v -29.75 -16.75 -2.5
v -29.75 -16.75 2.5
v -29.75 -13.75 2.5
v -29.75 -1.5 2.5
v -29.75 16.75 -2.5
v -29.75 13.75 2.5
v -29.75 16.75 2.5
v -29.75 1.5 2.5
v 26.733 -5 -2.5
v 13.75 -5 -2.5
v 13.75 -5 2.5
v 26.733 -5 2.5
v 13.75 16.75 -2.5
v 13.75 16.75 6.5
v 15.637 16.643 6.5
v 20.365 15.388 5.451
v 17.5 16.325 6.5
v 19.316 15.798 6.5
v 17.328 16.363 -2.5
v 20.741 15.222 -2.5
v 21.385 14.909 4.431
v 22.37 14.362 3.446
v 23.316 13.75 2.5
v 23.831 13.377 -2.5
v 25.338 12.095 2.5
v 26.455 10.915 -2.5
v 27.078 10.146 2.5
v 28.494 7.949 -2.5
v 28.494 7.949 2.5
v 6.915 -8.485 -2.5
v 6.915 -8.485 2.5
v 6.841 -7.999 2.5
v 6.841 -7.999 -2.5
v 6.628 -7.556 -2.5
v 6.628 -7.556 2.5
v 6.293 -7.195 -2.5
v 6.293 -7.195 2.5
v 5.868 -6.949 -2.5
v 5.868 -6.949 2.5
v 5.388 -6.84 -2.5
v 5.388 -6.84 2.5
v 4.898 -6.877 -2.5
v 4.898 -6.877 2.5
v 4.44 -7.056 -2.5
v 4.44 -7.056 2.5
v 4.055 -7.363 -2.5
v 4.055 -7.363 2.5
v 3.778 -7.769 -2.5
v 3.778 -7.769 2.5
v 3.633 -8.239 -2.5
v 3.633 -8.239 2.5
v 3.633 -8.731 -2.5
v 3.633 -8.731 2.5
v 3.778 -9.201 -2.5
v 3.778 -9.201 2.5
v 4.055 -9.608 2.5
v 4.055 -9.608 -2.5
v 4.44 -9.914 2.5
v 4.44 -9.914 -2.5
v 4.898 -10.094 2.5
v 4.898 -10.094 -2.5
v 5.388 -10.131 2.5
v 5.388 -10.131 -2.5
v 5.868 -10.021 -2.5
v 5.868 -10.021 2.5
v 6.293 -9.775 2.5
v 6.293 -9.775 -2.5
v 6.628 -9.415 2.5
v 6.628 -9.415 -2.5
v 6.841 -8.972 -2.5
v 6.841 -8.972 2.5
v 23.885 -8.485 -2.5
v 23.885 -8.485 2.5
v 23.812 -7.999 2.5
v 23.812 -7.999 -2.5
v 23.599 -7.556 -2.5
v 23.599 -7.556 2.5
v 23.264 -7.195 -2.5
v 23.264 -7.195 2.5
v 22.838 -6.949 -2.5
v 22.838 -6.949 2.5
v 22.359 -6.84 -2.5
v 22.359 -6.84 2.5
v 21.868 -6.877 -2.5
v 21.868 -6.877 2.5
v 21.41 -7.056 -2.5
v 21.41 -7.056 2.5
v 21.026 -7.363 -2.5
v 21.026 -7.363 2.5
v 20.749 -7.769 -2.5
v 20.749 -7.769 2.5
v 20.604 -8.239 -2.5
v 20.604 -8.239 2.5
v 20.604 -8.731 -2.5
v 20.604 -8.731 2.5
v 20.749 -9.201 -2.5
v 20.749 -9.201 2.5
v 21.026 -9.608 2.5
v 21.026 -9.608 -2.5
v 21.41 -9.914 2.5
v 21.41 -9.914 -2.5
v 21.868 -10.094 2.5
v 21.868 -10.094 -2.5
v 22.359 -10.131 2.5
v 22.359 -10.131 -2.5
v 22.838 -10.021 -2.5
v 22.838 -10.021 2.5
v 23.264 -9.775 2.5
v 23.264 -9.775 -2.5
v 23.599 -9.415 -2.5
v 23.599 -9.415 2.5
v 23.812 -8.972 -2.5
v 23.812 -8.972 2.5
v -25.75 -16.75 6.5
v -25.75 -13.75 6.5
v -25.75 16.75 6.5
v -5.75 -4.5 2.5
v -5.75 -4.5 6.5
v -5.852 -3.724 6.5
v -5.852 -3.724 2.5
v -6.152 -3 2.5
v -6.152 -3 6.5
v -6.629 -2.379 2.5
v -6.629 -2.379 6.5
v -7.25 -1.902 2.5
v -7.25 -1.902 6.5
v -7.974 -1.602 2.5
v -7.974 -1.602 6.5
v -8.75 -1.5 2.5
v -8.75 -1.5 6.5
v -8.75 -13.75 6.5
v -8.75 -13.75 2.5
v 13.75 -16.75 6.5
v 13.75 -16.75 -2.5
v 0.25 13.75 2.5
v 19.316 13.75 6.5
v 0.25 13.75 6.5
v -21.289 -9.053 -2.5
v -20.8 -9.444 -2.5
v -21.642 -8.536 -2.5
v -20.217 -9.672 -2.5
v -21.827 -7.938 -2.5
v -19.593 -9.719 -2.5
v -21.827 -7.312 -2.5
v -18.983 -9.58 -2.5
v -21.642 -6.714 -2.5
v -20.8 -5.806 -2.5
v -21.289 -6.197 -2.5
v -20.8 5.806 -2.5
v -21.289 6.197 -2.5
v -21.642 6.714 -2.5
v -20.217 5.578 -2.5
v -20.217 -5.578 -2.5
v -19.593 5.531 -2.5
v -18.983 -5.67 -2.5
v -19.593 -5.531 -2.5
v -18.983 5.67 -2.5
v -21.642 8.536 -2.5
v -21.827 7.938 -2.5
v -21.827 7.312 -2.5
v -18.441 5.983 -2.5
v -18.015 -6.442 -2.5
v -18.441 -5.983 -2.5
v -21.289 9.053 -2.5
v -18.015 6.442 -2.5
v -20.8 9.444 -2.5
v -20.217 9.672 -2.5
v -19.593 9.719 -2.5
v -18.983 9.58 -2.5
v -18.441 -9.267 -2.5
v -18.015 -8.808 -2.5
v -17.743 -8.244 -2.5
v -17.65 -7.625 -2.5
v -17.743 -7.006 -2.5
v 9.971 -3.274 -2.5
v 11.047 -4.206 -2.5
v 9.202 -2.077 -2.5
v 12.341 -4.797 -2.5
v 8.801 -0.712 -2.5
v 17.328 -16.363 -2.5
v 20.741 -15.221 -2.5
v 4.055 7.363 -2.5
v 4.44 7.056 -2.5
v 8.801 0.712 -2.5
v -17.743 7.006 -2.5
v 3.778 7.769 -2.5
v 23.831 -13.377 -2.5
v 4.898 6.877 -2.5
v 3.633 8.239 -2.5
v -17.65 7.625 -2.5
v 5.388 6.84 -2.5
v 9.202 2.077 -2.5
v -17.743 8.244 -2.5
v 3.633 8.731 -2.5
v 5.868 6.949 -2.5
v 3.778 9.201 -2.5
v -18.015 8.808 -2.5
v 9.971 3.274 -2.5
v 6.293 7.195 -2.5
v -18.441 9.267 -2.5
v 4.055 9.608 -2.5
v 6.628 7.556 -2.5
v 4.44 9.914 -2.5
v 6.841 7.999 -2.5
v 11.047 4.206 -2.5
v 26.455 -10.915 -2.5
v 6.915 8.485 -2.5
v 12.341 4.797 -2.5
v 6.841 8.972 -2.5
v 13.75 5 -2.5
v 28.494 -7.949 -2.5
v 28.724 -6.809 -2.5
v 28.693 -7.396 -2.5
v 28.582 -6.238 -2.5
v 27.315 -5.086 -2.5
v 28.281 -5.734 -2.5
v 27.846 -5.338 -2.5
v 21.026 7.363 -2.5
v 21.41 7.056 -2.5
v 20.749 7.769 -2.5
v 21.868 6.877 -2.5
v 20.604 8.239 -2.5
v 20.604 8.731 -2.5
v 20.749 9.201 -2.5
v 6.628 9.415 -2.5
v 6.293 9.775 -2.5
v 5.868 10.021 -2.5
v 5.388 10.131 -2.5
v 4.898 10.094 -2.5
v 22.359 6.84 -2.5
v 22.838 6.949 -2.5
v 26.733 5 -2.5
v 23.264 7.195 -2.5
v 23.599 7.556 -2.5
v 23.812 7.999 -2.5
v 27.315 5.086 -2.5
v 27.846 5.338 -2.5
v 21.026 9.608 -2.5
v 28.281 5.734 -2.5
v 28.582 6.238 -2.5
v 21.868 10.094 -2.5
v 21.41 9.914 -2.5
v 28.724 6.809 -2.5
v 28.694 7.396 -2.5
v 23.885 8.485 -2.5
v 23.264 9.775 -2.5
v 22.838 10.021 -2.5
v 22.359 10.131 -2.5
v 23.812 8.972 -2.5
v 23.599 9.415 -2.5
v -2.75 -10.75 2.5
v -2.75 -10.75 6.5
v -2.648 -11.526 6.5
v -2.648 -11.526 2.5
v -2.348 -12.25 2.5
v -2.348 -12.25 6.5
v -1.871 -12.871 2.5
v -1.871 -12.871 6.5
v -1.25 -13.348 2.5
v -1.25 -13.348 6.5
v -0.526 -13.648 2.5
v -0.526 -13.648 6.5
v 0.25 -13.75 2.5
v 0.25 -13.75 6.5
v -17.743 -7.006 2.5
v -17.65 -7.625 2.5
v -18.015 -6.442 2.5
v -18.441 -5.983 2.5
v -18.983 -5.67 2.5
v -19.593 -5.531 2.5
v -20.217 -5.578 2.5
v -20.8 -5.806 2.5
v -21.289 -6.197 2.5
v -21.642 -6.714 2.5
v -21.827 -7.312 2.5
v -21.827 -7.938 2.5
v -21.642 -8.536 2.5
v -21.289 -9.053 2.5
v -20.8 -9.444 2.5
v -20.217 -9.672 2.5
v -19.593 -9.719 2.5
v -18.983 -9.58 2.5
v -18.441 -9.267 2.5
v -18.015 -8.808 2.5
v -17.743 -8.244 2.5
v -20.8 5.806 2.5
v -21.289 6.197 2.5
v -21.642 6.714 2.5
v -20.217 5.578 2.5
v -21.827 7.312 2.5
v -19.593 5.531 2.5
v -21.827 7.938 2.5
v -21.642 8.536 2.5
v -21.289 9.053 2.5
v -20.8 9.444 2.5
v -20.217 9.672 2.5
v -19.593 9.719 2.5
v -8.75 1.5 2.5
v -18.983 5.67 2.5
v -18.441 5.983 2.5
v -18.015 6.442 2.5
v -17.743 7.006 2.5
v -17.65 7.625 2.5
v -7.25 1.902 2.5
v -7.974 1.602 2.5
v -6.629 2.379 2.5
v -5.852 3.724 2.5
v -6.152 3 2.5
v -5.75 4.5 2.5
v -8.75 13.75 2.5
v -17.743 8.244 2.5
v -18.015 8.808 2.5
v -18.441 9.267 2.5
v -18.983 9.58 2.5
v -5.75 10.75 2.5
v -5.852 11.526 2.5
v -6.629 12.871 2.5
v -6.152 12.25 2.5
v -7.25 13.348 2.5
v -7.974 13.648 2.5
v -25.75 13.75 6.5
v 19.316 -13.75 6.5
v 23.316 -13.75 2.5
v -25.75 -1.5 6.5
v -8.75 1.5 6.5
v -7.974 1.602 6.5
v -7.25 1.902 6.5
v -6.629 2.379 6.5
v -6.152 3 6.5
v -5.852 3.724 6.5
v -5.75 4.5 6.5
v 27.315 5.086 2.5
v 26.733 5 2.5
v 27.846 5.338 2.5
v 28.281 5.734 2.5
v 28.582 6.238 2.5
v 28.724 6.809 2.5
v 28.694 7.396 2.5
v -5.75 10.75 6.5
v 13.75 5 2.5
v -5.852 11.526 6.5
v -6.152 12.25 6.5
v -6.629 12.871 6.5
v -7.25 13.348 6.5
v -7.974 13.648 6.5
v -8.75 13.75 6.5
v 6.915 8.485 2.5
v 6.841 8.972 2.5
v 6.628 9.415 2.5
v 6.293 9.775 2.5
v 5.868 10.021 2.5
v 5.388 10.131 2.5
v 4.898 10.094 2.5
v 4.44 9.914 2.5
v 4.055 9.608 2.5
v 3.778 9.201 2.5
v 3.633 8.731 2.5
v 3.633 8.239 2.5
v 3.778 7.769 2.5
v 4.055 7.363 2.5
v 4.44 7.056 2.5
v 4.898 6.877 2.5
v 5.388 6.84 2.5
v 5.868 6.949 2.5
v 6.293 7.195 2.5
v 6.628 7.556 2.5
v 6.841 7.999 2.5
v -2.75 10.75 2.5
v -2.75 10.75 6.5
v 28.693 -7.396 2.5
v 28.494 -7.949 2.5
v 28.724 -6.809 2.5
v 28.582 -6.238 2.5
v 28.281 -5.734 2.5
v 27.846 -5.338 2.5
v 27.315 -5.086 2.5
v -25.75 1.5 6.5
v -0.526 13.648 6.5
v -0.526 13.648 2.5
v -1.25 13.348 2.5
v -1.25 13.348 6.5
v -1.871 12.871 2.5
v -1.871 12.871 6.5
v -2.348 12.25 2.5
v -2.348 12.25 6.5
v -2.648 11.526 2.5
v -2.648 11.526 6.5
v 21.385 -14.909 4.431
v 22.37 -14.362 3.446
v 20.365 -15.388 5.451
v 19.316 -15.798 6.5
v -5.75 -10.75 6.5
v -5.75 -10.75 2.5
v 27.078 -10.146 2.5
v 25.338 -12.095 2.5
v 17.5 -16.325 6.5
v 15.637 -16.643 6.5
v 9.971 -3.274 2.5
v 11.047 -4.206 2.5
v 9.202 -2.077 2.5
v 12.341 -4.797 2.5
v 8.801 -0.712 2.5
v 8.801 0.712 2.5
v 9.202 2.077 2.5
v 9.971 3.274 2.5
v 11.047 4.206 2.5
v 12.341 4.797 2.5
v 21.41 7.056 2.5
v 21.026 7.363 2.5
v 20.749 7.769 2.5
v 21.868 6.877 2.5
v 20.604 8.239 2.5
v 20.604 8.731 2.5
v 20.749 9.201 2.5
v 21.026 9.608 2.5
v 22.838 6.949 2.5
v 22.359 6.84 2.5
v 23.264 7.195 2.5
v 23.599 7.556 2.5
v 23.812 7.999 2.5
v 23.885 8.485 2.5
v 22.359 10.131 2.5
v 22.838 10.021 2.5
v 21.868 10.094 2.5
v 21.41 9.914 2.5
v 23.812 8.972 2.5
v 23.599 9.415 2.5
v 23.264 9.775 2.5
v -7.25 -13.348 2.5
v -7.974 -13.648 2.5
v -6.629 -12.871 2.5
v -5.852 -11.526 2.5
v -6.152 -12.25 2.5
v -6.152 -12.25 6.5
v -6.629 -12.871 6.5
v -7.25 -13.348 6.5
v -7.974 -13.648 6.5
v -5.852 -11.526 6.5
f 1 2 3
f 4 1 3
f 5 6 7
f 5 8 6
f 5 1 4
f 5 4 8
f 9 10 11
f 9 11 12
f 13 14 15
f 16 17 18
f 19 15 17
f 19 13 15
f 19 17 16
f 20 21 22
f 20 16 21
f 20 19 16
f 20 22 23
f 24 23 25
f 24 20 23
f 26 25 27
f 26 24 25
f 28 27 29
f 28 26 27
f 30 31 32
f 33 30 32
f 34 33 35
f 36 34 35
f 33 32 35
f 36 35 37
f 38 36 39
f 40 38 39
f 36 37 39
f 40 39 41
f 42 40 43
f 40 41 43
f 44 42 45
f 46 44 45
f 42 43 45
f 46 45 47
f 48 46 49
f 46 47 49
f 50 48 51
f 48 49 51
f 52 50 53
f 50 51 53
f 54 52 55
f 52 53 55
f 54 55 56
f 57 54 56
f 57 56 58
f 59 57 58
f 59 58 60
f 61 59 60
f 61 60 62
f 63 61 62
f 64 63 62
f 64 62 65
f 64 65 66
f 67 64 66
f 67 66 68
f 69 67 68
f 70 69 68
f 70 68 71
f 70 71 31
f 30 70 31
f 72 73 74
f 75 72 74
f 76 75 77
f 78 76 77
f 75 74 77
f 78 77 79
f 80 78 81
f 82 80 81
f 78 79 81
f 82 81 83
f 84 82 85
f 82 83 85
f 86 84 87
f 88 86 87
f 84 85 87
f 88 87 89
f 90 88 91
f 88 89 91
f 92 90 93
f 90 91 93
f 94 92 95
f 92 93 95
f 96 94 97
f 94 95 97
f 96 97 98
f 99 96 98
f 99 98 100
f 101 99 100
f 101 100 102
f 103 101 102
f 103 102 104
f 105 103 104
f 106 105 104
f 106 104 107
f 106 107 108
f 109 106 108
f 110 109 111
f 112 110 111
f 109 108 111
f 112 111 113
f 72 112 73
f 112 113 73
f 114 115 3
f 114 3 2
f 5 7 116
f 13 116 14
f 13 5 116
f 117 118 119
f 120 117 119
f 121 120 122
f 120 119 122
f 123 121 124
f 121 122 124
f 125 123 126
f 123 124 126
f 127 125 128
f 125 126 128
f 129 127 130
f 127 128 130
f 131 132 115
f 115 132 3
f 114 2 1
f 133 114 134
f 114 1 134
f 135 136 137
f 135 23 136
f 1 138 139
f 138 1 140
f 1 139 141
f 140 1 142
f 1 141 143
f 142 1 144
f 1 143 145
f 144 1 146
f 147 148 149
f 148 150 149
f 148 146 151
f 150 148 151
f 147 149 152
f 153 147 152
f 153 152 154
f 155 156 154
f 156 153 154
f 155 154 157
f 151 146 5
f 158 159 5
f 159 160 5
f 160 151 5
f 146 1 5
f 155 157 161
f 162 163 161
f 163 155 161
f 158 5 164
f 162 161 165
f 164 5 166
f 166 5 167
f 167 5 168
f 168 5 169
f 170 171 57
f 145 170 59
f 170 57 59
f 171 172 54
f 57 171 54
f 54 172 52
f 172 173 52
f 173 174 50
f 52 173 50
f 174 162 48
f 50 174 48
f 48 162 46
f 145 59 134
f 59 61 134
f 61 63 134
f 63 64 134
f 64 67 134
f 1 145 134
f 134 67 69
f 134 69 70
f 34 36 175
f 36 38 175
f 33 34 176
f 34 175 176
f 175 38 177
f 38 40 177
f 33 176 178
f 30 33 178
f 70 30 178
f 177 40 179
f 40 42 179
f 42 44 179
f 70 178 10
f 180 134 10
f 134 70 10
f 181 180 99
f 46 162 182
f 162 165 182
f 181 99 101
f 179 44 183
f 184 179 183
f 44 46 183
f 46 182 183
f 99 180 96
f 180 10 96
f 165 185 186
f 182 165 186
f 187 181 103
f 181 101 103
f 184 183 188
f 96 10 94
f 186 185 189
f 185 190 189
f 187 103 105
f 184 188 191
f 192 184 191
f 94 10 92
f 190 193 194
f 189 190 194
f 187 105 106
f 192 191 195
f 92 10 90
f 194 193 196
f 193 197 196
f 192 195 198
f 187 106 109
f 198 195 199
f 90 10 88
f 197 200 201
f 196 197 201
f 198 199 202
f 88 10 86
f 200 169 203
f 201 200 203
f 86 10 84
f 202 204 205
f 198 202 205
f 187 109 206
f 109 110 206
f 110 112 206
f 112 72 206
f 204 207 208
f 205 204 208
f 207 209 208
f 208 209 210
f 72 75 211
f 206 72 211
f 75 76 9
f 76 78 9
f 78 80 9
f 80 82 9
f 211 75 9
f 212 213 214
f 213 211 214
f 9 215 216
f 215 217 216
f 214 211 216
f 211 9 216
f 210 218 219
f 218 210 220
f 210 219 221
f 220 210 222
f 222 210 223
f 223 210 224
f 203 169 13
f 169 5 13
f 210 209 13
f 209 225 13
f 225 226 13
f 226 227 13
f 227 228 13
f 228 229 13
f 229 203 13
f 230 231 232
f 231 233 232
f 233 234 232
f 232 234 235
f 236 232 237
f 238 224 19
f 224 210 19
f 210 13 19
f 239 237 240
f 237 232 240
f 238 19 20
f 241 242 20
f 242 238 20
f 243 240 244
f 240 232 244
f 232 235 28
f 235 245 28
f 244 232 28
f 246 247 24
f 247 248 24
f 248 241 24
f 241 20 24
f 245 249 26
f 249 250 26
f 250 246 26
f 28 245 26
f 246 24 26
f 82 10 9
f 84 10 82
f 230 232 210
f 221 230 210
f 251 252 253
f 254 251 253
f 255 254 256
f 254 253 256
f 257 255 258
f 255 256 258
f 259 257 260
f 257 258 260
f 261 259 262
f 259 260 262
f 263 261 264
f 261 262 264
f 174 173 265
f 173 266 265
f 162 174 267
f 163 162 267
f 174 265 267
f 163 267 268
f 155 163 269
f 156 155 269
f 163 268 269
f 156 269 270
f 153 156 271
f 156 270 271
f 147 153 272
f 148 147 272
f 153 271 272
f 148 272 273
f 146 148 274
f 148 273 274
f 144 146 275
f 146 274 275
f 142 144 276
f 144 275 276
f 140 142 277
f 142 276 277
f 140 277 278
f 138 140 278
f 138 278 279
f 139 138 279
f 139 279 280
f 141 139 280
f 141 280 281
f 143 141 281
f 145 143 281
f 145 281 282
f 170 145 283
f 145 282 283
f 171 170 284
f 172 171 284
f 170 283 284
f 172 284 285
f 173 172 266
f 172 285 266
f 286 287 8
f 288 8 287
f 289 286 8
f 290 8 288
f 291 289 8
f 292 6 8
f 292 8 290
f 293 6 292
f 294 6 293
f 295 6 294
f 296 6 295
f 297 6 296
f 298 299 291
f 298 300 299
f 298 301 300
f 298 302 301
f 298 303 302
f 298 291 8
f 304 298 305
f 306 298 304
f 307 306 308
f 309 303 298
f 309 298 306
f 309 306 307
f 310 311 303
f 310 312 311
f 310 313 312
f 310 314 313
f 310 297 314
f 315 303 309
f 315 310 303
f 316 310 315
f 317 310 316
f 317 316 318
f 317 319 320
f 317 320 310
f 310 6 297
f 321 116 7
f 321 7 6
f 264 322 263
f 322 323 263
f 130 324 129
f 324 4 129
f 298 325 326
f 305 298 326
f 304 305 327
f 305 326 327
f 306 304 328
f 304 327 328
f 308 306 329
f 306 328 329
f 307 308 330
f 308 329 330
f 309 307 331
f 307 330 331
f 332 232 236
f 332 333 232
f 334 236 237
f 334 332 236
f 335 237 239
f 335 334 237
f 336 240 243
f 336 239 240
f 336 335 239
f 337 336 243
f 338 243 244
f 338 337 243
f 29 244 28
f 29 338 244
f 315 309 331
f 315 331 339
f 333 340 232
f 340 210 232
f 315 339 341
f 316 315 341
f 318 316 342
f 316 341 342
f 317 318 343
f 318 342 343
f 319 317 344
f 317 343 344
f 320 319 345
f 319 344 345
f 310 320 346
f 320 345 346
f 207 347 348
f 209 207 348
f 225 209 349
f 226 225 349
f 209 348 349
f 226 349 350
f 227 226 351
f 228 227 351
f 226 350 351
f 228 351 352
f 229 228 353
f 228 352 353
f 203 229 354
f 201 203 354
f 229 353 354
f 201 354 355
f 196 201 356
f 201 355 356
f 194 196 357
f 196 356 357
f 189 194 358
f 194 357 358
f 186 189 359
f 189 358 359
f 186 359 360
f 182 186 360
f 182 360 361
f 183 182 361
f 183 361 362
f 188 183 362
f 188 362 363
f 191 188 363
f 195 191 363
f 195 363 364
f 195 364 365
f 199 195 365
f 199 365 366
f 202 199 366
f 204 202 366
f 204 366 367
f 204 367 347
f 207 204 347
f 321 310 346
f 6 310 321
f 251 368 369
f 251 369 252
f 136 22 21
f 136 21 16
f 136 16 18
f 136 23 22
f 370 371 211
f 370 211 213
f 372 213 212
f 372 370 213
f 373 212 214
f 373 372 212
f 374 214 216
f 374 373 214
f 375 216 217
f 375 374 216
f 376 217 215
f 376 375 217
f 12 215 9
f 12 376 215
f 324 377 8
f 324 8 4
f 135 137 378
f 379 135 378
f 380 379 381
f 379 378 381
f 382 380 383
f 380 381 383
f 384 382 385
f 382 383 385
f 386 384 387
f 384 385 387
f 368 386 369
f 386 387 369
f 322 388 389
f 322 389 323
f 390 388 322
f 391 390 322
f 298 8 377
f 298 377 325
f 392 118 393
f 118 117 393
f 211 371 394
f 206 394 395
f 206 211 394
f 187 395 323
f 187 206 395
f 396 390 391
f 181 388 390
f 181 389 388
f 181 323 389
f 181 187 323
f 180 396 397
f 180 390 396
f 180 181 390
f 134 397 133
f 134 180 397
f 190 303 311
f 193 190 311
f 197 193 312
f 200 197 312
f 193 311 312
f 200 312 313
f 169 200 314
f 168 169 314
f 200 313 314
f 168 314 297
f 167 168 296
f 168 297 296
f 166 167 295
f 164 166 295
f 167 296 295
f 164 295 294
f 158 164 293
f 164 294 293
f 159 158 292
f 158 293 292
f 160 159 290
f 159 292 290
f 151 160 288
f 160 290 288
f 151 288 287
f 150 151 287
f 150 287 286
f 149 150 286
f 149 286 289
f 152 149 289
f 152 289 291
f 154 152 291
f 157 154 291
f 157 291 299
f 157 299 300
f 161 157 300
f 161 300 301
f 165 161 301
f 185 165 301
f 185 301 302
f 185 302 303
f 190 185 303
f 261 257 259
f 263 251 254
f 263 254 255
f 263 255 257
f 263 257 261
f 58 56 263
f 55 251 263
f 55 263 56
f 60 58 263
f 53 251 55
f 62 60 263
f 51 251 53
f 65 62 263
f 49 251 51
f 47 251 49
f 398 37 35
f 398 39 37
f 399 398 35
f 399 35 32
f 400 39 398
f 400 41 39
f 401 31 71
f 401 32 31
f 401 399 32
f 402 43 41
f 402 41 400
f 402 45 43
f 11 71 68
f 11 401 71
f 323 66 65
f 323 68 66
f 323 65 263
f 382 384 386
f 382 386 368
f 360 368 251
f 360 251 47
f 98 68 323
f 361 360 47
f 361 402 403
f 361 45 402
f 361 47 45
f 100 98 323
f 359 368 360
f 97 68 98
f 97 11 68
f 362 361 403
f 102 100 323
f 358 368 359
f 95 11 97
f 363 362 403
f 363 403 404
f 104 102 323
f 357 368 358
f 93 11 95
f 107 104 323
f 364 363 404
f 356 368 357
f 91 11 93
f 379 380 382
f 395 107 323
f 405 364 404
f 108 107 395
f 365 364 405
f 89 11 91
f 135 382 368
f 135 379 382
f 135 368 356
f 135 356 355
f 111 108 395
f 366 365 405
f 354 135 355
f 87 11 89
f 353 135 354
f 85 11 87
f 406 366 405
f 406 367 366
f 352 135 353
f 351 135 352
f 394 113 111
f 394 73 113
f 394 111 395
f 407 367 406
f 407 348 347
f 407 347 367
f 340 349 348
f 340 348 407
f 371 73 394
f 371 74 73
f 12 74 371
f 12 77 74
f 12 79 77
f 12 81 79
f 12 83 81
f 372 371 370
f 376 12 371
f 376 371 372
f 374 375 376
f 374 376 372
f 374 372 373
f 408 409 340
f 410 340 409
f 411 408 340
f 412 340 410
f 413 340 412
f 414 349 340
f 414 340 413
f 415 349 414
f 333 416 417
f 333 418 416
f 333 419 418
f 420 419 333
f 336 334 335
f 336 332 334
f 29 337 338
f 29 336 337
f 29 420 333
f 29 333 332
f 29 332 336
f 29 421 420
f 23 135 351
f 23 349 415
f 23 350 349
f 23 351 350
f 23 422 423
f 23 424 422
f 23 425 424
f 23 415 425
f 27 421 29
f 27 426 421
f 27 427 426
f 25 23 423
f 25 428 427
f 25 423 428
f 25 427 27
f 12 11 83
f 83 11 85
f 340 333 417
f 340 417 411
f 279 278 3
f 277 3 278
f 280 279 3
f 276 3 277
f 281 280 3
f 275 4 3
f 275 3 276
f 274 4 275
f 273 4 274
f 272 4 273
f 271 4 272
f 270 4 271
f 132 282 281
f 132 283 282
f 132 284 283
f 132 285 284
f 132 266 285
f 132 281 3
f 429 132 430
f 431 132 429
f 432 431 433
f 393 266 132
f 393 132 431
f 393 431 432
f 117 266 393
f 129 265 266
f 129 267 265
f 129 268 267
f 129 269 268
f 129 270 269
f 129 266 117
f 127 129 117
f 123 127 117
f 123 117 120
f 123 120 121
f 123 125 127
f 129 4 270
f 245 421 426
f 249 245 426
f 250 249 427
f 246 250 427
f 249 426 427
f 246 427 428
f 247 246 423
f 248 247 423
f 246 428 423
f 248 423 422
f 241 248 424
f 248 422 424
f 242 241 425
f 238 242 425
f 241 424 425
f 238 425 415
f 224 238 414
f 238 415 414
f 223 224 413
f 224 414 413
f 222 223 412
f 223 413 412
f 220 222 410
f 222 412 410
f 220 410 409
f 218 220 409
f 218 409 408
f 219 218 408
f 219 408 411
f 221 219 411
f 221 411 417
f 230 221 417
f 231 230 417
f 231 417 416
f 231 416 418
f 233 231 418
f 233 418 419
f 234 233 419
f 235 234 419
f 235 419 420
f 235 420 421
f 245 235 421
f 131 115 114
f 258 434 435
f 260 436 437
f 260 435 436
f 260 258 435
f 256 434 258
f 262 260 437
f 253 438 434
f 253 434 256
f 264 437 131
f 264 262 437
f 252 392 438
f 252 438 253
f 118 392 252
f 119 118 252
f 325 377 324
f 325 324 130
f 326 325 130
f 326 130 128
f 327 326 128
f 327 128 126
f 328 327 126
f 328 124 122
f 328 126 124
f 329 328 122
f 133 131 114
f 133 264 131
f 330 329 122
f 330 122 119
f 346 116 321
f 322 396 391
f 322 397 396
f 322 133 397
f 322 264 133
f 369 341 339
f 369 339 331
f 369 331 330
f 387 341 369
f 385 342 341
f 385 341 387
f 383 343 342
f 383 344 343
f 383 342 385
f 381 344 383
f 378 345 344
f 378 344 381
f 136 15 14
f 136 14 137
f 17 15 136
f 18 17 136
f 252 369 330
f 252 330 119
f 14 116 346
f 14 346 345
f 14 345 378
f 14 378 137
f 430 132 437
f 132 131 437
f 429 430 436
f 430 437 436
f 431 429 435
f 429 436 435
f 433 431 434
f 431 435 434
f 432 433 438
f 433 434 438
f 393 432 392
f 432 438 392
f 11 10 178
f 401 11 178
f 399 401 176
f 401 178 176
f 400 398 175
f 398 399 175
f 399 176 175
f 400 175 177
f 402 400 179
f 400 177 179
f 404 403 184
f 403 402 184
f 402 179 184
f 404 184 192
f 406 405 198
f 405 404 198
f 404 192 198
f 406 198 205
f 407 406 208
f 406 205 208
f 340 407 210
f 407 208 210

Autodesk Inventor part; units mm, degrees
ref_plane "YZ Plane" through (0, 0, 0) normal (1, 0, 0) x (0, 1, 0)
ref_plane "XZ Plane" through (0, 0, 0) normal (0, 1, 0) x (-1, 0, 0)
ref_plane "XY Plane" through (0, 0, 0) normal (0, 0, 1) x (1, 0, 0)
sketch "Sketch1" plane through (0, 0, 0) normal (0, 0, 1) x (1, 0, 0)
  arc A0 (13.75, 5) -> (13.75, -5) centre (13.75, 0) ccw
  line L0 (29.75, 16.75) -> (-29.75, 16.75)
  line L1 (-29.75, 16.75) -> (-29.75, -16.75)
  line L2 (-29.75, -16.75) -> (29.75, -16.75)
  line L3 (29.75, -16.75) -> (29.75, 16.75)
  line L4 (13.75, 5) -> (29.75, 5)
  line L5 (13.75, -5) -> (29.75, -5)
  arc A1 (13.75, -5) -> (13.75, 5) centre (13.75, 0) ccw construction
  point P0 (0, 0)
  point P1 (0, -16.75)
  point P2 (29.75, 0)
  point P3 (-29.75, 0)
  dimension "d0" = 10
  dimension "d1" = 33.5
  dimension "d2" = 16
  dimension "d3" = 43.5
extrude "Extrusion1" add sketch "Sketch1" along normal mid plane 5 contours A0 L5 L3 L2 L1 L0 L4
sketch "Sketch2" plane through (0, 0, 2.5) normal (0, 0, 1) x (1, 0, 0)
  arc A0 (13.75, 5) -> (13.75, -5) centre (13.75, 0) ccw projected
  circle A1 centre (5.2647, 8.4853) radius 1.65
  line L0 (13.75, 0) -> (5.2647, 8.4853) construction
  line L1 (13.75, 0) -> (0, 0) construction
  line L2 (13.75, 0) -> (13.75, -13.75) construction
  circle A2 centre (5.2647, -8.4853) radius 1.65
  line L3 (13.75, 0) -> (27.5, 0) construction
  circle A3 centre (22.2353, -8.4853) radius 1.65
  line L4 (13.75, 0) -> (13.75, 13.75) construction
  circle A4 centre (22.2353, 8.4853) radius 1.65
  dimension "d6" = 45
  dimension "d7" = 12
  dimension "d8" = 3.3
  dimension "d11" = 360
extrude "Extrusion2" cut sketch "Sketch2" against normal through all
sketch "Sketch3" plane through (0, 0, 2.5) normal (0, 0, 1) x (1, 0, 0)
  circle A0 centre (-19.75, 7.625) radius 2.1
  line L0 (0, 0) -> (-29.75, 0) construction
  line L1 (-29.75, 16.75) -> (-29.75, -16.75) projected
  circle A1 centre (-19.75, -7.625) radius 2.1
  dimension "d15" = 4.2
  dimension "d16" = 10
  dimension "d37" = 9.125
extrude "Extrusion3" cut sketch "Sketch3" against normal through all
sketch "Sketch4" plane through (0, 0, 2.5) normal (0, 0, 1) x (1, 0, 0)
  line L0 (-29.75, 16.75) -> (29.75, 16.75) projected
  line L1 (-29.75, 16.75) -> (29.75, 16.75)
  line L2 (29.75, 16.75) -> (29.75, 13.75)
  line L3 (-29.75, 13.75) -> (-29.75, 16.75)
  line L4 (-2.75, 13.75) -> (-2.75, 0)
  line L5 (-5.75, 1.5) -> (-5.75, 13.75)
  line L6 (-29.75, 1.5) -> (-5.75, 1.5)
  line L7 (-29.75, 0) -> (-29.75, 1.5)
  line L8 (29.75, 13.75) -> (-2.75, 13.75)
  line L9 (-5.75, 13.75) -> (-29.75, 13.75)
  line L10 (0, 0) -> (-29.75, 0) construction
  line L11 (-29.75, -16.75) -> (-29.75, 16.75) projected
  line L12 (-29.75, -16.75) -> (29.75, -16.75)
  line L13 (-29.75, -16.75) -> (29.75, -16.75)
  line L14 (29.75, -16.75) -> (29.75, -13.75)
  line L15 (-29.75, -13.75) -> (-29.75, -16.75)
  line L16 (-2.75, -13.75) -> (-2.75, 0)
  line L17 (-5.75, -1.5) -> (-5.75, -13.75)
  line L18 (-29.75, -1.5) -> (-5.75, -1.5)
  line L19 (-29.75, 0) -> (-29.75, -1.5)
  line L20 (29.75, -13.75) -> (-2.75, -13.75)
  line L21 (-5.75, -13.75) -> (-29.75, -13.75)
  point P0 (29.75, 5)
  dimension "d20" = 3
  dimension "d21" = 3
  dimension "d23" = 24
  dimension "d24" = 1.5
extrude "Extrusion4" add sketch "Sketch4" along normal blind 4 contours L0 L2 L8 L4 L16 L20 L14 L12 L11 L21 L17 L18 L7 L6 L5 L9 L3
sketch "Sketch5" plane through (0, 0, -2.5) normal (0, 0, -1) x (-1, 0, 0)
  arc A0 (-13.75, -5) -> (-13.75, 5) centre (-13.75, 0) ccw projected
  line L0 (29.75, 16.75) -> (-29.75, 16.75) projected
  circle A1 centre (19.75, 7.625) radius 2.1 projected
  circle A2 centre (19.75, -7.625) radius 2.1 projected
  circle A3 centre (-22.2353, -8.4853) radius 1.65 projected
  circle A4 centre (-5.2647, 8.4853) radius 1.65 projected
  circle A5 centre (-5.2647, -8.4853) radius 1.65 projected
  circle A6 centre (-22.2353, 8.4853) radius 1.65 projected
  line L1 (29.75, 16.75) -> (-29.75, 16.75) projected
  line L2 (-29.75, 16.75) -> (-29.75, 5) projected
  line L3 (-29.75, 5) -> (-13.75, 5) projected
  arc A7 (-13.75, -5) -> (-13.75, 5) centre (-13.75, 0) ccw projected
  line L4 (-13.75, -5) -> (-29.75, -5) projected
  line L5 (-29.75, -5) -> (-29.75, -16.75) projected
  line L6 (-29.75, -16.75) -> (29.75, -16.75) projected
  line L7 (29.75, -16.75) -> (29.75, 16.75) projected
  line L8 (-13.75, -16.75) -> (-29.75, -16.75)
  line L9 (-29.75, -13.75) -> (-29.75, -5) projected
  line L10 (-29.75, -5) -> (-29.75, -16.75)
  line L11 (-29.75, 5) -> (-29.75, 16.75)
  line L12 (-13.75, 16.75) -> (-29.75, 16.75)
  arc A8 (-13.75, 16.75) -> (-29.7363, 5) centre (-13.75, 0) ccw
  arc A9 (-29.7363, -5) -> (-13.75, -16.75) centre (-13.75, 0) ccw
  point P0 (0, 0)
extrude "Extrusion5" cut sketch "Sketch5" against normal through all contours A9 L6 L5 L4 | L3 L2 L0 A8
fillet "Fillet1" radius 2 2 edges at (29.7363, -5, 0) (29.7363, 5, 0)
chamfer "Chamfer1" distance 4 angle 45 3 edges at (-29.75, 15.25, 6.5) (-29.75, 0, 6.5) (-29.75, -15.25, 6.5)
sketch "Sketch6" plane through (-29.75, -16.75, -2.5) normal (0, -1, 0) x (1, 0, 0)
  line L0 (58.2436, 5) -> (58.2436, 0) projected
  line L1 (53.0656, 5) -> (58.2436, 5) projected
  line L2 (53.0656, 9) -> (53.0656, 5) projected
  line L3 (43.5, 9) -> (53.0656, 9) projected
  line L4 (43.5, 9) -> (43.5, 0) projected
  line L5 (58.2436, 0) -> (43.5, 0) projected
  line L6 (53.0656, 5) -> (49.0656, 9)
  line L7 (27, 9) -> (53.0656, 9) projected
  line L8 (53.0656, 9) -> (27, 9) projected
  line L9 (49.0656, 9) -> (53.0656, 9)
  line L10 (53.0656, 9) -> (53.0656, 5)
  point P0 (29.75, 2.5)
  dimension "d33" = 45
extrude "Extrusion6" cut sketch "Sketch6" against normal through all contours L6 L3 L2
fillet "Fillet2" radius 3 6 edges at (-2.75, -13.75, 4.5) (-5.75, -13.75, 4.5) (-2.75, 13.75, 4.5) (-5.75, -1.5, 4.5) (-5.75, 13.75, 4.5) (-5.75, 1.5, 4.5)
equation "\"d21\" = d20"
equation "\"d24\" = 0.5 * d20"
properties part number "holder-LMF8LUU-z-axis-v2"
